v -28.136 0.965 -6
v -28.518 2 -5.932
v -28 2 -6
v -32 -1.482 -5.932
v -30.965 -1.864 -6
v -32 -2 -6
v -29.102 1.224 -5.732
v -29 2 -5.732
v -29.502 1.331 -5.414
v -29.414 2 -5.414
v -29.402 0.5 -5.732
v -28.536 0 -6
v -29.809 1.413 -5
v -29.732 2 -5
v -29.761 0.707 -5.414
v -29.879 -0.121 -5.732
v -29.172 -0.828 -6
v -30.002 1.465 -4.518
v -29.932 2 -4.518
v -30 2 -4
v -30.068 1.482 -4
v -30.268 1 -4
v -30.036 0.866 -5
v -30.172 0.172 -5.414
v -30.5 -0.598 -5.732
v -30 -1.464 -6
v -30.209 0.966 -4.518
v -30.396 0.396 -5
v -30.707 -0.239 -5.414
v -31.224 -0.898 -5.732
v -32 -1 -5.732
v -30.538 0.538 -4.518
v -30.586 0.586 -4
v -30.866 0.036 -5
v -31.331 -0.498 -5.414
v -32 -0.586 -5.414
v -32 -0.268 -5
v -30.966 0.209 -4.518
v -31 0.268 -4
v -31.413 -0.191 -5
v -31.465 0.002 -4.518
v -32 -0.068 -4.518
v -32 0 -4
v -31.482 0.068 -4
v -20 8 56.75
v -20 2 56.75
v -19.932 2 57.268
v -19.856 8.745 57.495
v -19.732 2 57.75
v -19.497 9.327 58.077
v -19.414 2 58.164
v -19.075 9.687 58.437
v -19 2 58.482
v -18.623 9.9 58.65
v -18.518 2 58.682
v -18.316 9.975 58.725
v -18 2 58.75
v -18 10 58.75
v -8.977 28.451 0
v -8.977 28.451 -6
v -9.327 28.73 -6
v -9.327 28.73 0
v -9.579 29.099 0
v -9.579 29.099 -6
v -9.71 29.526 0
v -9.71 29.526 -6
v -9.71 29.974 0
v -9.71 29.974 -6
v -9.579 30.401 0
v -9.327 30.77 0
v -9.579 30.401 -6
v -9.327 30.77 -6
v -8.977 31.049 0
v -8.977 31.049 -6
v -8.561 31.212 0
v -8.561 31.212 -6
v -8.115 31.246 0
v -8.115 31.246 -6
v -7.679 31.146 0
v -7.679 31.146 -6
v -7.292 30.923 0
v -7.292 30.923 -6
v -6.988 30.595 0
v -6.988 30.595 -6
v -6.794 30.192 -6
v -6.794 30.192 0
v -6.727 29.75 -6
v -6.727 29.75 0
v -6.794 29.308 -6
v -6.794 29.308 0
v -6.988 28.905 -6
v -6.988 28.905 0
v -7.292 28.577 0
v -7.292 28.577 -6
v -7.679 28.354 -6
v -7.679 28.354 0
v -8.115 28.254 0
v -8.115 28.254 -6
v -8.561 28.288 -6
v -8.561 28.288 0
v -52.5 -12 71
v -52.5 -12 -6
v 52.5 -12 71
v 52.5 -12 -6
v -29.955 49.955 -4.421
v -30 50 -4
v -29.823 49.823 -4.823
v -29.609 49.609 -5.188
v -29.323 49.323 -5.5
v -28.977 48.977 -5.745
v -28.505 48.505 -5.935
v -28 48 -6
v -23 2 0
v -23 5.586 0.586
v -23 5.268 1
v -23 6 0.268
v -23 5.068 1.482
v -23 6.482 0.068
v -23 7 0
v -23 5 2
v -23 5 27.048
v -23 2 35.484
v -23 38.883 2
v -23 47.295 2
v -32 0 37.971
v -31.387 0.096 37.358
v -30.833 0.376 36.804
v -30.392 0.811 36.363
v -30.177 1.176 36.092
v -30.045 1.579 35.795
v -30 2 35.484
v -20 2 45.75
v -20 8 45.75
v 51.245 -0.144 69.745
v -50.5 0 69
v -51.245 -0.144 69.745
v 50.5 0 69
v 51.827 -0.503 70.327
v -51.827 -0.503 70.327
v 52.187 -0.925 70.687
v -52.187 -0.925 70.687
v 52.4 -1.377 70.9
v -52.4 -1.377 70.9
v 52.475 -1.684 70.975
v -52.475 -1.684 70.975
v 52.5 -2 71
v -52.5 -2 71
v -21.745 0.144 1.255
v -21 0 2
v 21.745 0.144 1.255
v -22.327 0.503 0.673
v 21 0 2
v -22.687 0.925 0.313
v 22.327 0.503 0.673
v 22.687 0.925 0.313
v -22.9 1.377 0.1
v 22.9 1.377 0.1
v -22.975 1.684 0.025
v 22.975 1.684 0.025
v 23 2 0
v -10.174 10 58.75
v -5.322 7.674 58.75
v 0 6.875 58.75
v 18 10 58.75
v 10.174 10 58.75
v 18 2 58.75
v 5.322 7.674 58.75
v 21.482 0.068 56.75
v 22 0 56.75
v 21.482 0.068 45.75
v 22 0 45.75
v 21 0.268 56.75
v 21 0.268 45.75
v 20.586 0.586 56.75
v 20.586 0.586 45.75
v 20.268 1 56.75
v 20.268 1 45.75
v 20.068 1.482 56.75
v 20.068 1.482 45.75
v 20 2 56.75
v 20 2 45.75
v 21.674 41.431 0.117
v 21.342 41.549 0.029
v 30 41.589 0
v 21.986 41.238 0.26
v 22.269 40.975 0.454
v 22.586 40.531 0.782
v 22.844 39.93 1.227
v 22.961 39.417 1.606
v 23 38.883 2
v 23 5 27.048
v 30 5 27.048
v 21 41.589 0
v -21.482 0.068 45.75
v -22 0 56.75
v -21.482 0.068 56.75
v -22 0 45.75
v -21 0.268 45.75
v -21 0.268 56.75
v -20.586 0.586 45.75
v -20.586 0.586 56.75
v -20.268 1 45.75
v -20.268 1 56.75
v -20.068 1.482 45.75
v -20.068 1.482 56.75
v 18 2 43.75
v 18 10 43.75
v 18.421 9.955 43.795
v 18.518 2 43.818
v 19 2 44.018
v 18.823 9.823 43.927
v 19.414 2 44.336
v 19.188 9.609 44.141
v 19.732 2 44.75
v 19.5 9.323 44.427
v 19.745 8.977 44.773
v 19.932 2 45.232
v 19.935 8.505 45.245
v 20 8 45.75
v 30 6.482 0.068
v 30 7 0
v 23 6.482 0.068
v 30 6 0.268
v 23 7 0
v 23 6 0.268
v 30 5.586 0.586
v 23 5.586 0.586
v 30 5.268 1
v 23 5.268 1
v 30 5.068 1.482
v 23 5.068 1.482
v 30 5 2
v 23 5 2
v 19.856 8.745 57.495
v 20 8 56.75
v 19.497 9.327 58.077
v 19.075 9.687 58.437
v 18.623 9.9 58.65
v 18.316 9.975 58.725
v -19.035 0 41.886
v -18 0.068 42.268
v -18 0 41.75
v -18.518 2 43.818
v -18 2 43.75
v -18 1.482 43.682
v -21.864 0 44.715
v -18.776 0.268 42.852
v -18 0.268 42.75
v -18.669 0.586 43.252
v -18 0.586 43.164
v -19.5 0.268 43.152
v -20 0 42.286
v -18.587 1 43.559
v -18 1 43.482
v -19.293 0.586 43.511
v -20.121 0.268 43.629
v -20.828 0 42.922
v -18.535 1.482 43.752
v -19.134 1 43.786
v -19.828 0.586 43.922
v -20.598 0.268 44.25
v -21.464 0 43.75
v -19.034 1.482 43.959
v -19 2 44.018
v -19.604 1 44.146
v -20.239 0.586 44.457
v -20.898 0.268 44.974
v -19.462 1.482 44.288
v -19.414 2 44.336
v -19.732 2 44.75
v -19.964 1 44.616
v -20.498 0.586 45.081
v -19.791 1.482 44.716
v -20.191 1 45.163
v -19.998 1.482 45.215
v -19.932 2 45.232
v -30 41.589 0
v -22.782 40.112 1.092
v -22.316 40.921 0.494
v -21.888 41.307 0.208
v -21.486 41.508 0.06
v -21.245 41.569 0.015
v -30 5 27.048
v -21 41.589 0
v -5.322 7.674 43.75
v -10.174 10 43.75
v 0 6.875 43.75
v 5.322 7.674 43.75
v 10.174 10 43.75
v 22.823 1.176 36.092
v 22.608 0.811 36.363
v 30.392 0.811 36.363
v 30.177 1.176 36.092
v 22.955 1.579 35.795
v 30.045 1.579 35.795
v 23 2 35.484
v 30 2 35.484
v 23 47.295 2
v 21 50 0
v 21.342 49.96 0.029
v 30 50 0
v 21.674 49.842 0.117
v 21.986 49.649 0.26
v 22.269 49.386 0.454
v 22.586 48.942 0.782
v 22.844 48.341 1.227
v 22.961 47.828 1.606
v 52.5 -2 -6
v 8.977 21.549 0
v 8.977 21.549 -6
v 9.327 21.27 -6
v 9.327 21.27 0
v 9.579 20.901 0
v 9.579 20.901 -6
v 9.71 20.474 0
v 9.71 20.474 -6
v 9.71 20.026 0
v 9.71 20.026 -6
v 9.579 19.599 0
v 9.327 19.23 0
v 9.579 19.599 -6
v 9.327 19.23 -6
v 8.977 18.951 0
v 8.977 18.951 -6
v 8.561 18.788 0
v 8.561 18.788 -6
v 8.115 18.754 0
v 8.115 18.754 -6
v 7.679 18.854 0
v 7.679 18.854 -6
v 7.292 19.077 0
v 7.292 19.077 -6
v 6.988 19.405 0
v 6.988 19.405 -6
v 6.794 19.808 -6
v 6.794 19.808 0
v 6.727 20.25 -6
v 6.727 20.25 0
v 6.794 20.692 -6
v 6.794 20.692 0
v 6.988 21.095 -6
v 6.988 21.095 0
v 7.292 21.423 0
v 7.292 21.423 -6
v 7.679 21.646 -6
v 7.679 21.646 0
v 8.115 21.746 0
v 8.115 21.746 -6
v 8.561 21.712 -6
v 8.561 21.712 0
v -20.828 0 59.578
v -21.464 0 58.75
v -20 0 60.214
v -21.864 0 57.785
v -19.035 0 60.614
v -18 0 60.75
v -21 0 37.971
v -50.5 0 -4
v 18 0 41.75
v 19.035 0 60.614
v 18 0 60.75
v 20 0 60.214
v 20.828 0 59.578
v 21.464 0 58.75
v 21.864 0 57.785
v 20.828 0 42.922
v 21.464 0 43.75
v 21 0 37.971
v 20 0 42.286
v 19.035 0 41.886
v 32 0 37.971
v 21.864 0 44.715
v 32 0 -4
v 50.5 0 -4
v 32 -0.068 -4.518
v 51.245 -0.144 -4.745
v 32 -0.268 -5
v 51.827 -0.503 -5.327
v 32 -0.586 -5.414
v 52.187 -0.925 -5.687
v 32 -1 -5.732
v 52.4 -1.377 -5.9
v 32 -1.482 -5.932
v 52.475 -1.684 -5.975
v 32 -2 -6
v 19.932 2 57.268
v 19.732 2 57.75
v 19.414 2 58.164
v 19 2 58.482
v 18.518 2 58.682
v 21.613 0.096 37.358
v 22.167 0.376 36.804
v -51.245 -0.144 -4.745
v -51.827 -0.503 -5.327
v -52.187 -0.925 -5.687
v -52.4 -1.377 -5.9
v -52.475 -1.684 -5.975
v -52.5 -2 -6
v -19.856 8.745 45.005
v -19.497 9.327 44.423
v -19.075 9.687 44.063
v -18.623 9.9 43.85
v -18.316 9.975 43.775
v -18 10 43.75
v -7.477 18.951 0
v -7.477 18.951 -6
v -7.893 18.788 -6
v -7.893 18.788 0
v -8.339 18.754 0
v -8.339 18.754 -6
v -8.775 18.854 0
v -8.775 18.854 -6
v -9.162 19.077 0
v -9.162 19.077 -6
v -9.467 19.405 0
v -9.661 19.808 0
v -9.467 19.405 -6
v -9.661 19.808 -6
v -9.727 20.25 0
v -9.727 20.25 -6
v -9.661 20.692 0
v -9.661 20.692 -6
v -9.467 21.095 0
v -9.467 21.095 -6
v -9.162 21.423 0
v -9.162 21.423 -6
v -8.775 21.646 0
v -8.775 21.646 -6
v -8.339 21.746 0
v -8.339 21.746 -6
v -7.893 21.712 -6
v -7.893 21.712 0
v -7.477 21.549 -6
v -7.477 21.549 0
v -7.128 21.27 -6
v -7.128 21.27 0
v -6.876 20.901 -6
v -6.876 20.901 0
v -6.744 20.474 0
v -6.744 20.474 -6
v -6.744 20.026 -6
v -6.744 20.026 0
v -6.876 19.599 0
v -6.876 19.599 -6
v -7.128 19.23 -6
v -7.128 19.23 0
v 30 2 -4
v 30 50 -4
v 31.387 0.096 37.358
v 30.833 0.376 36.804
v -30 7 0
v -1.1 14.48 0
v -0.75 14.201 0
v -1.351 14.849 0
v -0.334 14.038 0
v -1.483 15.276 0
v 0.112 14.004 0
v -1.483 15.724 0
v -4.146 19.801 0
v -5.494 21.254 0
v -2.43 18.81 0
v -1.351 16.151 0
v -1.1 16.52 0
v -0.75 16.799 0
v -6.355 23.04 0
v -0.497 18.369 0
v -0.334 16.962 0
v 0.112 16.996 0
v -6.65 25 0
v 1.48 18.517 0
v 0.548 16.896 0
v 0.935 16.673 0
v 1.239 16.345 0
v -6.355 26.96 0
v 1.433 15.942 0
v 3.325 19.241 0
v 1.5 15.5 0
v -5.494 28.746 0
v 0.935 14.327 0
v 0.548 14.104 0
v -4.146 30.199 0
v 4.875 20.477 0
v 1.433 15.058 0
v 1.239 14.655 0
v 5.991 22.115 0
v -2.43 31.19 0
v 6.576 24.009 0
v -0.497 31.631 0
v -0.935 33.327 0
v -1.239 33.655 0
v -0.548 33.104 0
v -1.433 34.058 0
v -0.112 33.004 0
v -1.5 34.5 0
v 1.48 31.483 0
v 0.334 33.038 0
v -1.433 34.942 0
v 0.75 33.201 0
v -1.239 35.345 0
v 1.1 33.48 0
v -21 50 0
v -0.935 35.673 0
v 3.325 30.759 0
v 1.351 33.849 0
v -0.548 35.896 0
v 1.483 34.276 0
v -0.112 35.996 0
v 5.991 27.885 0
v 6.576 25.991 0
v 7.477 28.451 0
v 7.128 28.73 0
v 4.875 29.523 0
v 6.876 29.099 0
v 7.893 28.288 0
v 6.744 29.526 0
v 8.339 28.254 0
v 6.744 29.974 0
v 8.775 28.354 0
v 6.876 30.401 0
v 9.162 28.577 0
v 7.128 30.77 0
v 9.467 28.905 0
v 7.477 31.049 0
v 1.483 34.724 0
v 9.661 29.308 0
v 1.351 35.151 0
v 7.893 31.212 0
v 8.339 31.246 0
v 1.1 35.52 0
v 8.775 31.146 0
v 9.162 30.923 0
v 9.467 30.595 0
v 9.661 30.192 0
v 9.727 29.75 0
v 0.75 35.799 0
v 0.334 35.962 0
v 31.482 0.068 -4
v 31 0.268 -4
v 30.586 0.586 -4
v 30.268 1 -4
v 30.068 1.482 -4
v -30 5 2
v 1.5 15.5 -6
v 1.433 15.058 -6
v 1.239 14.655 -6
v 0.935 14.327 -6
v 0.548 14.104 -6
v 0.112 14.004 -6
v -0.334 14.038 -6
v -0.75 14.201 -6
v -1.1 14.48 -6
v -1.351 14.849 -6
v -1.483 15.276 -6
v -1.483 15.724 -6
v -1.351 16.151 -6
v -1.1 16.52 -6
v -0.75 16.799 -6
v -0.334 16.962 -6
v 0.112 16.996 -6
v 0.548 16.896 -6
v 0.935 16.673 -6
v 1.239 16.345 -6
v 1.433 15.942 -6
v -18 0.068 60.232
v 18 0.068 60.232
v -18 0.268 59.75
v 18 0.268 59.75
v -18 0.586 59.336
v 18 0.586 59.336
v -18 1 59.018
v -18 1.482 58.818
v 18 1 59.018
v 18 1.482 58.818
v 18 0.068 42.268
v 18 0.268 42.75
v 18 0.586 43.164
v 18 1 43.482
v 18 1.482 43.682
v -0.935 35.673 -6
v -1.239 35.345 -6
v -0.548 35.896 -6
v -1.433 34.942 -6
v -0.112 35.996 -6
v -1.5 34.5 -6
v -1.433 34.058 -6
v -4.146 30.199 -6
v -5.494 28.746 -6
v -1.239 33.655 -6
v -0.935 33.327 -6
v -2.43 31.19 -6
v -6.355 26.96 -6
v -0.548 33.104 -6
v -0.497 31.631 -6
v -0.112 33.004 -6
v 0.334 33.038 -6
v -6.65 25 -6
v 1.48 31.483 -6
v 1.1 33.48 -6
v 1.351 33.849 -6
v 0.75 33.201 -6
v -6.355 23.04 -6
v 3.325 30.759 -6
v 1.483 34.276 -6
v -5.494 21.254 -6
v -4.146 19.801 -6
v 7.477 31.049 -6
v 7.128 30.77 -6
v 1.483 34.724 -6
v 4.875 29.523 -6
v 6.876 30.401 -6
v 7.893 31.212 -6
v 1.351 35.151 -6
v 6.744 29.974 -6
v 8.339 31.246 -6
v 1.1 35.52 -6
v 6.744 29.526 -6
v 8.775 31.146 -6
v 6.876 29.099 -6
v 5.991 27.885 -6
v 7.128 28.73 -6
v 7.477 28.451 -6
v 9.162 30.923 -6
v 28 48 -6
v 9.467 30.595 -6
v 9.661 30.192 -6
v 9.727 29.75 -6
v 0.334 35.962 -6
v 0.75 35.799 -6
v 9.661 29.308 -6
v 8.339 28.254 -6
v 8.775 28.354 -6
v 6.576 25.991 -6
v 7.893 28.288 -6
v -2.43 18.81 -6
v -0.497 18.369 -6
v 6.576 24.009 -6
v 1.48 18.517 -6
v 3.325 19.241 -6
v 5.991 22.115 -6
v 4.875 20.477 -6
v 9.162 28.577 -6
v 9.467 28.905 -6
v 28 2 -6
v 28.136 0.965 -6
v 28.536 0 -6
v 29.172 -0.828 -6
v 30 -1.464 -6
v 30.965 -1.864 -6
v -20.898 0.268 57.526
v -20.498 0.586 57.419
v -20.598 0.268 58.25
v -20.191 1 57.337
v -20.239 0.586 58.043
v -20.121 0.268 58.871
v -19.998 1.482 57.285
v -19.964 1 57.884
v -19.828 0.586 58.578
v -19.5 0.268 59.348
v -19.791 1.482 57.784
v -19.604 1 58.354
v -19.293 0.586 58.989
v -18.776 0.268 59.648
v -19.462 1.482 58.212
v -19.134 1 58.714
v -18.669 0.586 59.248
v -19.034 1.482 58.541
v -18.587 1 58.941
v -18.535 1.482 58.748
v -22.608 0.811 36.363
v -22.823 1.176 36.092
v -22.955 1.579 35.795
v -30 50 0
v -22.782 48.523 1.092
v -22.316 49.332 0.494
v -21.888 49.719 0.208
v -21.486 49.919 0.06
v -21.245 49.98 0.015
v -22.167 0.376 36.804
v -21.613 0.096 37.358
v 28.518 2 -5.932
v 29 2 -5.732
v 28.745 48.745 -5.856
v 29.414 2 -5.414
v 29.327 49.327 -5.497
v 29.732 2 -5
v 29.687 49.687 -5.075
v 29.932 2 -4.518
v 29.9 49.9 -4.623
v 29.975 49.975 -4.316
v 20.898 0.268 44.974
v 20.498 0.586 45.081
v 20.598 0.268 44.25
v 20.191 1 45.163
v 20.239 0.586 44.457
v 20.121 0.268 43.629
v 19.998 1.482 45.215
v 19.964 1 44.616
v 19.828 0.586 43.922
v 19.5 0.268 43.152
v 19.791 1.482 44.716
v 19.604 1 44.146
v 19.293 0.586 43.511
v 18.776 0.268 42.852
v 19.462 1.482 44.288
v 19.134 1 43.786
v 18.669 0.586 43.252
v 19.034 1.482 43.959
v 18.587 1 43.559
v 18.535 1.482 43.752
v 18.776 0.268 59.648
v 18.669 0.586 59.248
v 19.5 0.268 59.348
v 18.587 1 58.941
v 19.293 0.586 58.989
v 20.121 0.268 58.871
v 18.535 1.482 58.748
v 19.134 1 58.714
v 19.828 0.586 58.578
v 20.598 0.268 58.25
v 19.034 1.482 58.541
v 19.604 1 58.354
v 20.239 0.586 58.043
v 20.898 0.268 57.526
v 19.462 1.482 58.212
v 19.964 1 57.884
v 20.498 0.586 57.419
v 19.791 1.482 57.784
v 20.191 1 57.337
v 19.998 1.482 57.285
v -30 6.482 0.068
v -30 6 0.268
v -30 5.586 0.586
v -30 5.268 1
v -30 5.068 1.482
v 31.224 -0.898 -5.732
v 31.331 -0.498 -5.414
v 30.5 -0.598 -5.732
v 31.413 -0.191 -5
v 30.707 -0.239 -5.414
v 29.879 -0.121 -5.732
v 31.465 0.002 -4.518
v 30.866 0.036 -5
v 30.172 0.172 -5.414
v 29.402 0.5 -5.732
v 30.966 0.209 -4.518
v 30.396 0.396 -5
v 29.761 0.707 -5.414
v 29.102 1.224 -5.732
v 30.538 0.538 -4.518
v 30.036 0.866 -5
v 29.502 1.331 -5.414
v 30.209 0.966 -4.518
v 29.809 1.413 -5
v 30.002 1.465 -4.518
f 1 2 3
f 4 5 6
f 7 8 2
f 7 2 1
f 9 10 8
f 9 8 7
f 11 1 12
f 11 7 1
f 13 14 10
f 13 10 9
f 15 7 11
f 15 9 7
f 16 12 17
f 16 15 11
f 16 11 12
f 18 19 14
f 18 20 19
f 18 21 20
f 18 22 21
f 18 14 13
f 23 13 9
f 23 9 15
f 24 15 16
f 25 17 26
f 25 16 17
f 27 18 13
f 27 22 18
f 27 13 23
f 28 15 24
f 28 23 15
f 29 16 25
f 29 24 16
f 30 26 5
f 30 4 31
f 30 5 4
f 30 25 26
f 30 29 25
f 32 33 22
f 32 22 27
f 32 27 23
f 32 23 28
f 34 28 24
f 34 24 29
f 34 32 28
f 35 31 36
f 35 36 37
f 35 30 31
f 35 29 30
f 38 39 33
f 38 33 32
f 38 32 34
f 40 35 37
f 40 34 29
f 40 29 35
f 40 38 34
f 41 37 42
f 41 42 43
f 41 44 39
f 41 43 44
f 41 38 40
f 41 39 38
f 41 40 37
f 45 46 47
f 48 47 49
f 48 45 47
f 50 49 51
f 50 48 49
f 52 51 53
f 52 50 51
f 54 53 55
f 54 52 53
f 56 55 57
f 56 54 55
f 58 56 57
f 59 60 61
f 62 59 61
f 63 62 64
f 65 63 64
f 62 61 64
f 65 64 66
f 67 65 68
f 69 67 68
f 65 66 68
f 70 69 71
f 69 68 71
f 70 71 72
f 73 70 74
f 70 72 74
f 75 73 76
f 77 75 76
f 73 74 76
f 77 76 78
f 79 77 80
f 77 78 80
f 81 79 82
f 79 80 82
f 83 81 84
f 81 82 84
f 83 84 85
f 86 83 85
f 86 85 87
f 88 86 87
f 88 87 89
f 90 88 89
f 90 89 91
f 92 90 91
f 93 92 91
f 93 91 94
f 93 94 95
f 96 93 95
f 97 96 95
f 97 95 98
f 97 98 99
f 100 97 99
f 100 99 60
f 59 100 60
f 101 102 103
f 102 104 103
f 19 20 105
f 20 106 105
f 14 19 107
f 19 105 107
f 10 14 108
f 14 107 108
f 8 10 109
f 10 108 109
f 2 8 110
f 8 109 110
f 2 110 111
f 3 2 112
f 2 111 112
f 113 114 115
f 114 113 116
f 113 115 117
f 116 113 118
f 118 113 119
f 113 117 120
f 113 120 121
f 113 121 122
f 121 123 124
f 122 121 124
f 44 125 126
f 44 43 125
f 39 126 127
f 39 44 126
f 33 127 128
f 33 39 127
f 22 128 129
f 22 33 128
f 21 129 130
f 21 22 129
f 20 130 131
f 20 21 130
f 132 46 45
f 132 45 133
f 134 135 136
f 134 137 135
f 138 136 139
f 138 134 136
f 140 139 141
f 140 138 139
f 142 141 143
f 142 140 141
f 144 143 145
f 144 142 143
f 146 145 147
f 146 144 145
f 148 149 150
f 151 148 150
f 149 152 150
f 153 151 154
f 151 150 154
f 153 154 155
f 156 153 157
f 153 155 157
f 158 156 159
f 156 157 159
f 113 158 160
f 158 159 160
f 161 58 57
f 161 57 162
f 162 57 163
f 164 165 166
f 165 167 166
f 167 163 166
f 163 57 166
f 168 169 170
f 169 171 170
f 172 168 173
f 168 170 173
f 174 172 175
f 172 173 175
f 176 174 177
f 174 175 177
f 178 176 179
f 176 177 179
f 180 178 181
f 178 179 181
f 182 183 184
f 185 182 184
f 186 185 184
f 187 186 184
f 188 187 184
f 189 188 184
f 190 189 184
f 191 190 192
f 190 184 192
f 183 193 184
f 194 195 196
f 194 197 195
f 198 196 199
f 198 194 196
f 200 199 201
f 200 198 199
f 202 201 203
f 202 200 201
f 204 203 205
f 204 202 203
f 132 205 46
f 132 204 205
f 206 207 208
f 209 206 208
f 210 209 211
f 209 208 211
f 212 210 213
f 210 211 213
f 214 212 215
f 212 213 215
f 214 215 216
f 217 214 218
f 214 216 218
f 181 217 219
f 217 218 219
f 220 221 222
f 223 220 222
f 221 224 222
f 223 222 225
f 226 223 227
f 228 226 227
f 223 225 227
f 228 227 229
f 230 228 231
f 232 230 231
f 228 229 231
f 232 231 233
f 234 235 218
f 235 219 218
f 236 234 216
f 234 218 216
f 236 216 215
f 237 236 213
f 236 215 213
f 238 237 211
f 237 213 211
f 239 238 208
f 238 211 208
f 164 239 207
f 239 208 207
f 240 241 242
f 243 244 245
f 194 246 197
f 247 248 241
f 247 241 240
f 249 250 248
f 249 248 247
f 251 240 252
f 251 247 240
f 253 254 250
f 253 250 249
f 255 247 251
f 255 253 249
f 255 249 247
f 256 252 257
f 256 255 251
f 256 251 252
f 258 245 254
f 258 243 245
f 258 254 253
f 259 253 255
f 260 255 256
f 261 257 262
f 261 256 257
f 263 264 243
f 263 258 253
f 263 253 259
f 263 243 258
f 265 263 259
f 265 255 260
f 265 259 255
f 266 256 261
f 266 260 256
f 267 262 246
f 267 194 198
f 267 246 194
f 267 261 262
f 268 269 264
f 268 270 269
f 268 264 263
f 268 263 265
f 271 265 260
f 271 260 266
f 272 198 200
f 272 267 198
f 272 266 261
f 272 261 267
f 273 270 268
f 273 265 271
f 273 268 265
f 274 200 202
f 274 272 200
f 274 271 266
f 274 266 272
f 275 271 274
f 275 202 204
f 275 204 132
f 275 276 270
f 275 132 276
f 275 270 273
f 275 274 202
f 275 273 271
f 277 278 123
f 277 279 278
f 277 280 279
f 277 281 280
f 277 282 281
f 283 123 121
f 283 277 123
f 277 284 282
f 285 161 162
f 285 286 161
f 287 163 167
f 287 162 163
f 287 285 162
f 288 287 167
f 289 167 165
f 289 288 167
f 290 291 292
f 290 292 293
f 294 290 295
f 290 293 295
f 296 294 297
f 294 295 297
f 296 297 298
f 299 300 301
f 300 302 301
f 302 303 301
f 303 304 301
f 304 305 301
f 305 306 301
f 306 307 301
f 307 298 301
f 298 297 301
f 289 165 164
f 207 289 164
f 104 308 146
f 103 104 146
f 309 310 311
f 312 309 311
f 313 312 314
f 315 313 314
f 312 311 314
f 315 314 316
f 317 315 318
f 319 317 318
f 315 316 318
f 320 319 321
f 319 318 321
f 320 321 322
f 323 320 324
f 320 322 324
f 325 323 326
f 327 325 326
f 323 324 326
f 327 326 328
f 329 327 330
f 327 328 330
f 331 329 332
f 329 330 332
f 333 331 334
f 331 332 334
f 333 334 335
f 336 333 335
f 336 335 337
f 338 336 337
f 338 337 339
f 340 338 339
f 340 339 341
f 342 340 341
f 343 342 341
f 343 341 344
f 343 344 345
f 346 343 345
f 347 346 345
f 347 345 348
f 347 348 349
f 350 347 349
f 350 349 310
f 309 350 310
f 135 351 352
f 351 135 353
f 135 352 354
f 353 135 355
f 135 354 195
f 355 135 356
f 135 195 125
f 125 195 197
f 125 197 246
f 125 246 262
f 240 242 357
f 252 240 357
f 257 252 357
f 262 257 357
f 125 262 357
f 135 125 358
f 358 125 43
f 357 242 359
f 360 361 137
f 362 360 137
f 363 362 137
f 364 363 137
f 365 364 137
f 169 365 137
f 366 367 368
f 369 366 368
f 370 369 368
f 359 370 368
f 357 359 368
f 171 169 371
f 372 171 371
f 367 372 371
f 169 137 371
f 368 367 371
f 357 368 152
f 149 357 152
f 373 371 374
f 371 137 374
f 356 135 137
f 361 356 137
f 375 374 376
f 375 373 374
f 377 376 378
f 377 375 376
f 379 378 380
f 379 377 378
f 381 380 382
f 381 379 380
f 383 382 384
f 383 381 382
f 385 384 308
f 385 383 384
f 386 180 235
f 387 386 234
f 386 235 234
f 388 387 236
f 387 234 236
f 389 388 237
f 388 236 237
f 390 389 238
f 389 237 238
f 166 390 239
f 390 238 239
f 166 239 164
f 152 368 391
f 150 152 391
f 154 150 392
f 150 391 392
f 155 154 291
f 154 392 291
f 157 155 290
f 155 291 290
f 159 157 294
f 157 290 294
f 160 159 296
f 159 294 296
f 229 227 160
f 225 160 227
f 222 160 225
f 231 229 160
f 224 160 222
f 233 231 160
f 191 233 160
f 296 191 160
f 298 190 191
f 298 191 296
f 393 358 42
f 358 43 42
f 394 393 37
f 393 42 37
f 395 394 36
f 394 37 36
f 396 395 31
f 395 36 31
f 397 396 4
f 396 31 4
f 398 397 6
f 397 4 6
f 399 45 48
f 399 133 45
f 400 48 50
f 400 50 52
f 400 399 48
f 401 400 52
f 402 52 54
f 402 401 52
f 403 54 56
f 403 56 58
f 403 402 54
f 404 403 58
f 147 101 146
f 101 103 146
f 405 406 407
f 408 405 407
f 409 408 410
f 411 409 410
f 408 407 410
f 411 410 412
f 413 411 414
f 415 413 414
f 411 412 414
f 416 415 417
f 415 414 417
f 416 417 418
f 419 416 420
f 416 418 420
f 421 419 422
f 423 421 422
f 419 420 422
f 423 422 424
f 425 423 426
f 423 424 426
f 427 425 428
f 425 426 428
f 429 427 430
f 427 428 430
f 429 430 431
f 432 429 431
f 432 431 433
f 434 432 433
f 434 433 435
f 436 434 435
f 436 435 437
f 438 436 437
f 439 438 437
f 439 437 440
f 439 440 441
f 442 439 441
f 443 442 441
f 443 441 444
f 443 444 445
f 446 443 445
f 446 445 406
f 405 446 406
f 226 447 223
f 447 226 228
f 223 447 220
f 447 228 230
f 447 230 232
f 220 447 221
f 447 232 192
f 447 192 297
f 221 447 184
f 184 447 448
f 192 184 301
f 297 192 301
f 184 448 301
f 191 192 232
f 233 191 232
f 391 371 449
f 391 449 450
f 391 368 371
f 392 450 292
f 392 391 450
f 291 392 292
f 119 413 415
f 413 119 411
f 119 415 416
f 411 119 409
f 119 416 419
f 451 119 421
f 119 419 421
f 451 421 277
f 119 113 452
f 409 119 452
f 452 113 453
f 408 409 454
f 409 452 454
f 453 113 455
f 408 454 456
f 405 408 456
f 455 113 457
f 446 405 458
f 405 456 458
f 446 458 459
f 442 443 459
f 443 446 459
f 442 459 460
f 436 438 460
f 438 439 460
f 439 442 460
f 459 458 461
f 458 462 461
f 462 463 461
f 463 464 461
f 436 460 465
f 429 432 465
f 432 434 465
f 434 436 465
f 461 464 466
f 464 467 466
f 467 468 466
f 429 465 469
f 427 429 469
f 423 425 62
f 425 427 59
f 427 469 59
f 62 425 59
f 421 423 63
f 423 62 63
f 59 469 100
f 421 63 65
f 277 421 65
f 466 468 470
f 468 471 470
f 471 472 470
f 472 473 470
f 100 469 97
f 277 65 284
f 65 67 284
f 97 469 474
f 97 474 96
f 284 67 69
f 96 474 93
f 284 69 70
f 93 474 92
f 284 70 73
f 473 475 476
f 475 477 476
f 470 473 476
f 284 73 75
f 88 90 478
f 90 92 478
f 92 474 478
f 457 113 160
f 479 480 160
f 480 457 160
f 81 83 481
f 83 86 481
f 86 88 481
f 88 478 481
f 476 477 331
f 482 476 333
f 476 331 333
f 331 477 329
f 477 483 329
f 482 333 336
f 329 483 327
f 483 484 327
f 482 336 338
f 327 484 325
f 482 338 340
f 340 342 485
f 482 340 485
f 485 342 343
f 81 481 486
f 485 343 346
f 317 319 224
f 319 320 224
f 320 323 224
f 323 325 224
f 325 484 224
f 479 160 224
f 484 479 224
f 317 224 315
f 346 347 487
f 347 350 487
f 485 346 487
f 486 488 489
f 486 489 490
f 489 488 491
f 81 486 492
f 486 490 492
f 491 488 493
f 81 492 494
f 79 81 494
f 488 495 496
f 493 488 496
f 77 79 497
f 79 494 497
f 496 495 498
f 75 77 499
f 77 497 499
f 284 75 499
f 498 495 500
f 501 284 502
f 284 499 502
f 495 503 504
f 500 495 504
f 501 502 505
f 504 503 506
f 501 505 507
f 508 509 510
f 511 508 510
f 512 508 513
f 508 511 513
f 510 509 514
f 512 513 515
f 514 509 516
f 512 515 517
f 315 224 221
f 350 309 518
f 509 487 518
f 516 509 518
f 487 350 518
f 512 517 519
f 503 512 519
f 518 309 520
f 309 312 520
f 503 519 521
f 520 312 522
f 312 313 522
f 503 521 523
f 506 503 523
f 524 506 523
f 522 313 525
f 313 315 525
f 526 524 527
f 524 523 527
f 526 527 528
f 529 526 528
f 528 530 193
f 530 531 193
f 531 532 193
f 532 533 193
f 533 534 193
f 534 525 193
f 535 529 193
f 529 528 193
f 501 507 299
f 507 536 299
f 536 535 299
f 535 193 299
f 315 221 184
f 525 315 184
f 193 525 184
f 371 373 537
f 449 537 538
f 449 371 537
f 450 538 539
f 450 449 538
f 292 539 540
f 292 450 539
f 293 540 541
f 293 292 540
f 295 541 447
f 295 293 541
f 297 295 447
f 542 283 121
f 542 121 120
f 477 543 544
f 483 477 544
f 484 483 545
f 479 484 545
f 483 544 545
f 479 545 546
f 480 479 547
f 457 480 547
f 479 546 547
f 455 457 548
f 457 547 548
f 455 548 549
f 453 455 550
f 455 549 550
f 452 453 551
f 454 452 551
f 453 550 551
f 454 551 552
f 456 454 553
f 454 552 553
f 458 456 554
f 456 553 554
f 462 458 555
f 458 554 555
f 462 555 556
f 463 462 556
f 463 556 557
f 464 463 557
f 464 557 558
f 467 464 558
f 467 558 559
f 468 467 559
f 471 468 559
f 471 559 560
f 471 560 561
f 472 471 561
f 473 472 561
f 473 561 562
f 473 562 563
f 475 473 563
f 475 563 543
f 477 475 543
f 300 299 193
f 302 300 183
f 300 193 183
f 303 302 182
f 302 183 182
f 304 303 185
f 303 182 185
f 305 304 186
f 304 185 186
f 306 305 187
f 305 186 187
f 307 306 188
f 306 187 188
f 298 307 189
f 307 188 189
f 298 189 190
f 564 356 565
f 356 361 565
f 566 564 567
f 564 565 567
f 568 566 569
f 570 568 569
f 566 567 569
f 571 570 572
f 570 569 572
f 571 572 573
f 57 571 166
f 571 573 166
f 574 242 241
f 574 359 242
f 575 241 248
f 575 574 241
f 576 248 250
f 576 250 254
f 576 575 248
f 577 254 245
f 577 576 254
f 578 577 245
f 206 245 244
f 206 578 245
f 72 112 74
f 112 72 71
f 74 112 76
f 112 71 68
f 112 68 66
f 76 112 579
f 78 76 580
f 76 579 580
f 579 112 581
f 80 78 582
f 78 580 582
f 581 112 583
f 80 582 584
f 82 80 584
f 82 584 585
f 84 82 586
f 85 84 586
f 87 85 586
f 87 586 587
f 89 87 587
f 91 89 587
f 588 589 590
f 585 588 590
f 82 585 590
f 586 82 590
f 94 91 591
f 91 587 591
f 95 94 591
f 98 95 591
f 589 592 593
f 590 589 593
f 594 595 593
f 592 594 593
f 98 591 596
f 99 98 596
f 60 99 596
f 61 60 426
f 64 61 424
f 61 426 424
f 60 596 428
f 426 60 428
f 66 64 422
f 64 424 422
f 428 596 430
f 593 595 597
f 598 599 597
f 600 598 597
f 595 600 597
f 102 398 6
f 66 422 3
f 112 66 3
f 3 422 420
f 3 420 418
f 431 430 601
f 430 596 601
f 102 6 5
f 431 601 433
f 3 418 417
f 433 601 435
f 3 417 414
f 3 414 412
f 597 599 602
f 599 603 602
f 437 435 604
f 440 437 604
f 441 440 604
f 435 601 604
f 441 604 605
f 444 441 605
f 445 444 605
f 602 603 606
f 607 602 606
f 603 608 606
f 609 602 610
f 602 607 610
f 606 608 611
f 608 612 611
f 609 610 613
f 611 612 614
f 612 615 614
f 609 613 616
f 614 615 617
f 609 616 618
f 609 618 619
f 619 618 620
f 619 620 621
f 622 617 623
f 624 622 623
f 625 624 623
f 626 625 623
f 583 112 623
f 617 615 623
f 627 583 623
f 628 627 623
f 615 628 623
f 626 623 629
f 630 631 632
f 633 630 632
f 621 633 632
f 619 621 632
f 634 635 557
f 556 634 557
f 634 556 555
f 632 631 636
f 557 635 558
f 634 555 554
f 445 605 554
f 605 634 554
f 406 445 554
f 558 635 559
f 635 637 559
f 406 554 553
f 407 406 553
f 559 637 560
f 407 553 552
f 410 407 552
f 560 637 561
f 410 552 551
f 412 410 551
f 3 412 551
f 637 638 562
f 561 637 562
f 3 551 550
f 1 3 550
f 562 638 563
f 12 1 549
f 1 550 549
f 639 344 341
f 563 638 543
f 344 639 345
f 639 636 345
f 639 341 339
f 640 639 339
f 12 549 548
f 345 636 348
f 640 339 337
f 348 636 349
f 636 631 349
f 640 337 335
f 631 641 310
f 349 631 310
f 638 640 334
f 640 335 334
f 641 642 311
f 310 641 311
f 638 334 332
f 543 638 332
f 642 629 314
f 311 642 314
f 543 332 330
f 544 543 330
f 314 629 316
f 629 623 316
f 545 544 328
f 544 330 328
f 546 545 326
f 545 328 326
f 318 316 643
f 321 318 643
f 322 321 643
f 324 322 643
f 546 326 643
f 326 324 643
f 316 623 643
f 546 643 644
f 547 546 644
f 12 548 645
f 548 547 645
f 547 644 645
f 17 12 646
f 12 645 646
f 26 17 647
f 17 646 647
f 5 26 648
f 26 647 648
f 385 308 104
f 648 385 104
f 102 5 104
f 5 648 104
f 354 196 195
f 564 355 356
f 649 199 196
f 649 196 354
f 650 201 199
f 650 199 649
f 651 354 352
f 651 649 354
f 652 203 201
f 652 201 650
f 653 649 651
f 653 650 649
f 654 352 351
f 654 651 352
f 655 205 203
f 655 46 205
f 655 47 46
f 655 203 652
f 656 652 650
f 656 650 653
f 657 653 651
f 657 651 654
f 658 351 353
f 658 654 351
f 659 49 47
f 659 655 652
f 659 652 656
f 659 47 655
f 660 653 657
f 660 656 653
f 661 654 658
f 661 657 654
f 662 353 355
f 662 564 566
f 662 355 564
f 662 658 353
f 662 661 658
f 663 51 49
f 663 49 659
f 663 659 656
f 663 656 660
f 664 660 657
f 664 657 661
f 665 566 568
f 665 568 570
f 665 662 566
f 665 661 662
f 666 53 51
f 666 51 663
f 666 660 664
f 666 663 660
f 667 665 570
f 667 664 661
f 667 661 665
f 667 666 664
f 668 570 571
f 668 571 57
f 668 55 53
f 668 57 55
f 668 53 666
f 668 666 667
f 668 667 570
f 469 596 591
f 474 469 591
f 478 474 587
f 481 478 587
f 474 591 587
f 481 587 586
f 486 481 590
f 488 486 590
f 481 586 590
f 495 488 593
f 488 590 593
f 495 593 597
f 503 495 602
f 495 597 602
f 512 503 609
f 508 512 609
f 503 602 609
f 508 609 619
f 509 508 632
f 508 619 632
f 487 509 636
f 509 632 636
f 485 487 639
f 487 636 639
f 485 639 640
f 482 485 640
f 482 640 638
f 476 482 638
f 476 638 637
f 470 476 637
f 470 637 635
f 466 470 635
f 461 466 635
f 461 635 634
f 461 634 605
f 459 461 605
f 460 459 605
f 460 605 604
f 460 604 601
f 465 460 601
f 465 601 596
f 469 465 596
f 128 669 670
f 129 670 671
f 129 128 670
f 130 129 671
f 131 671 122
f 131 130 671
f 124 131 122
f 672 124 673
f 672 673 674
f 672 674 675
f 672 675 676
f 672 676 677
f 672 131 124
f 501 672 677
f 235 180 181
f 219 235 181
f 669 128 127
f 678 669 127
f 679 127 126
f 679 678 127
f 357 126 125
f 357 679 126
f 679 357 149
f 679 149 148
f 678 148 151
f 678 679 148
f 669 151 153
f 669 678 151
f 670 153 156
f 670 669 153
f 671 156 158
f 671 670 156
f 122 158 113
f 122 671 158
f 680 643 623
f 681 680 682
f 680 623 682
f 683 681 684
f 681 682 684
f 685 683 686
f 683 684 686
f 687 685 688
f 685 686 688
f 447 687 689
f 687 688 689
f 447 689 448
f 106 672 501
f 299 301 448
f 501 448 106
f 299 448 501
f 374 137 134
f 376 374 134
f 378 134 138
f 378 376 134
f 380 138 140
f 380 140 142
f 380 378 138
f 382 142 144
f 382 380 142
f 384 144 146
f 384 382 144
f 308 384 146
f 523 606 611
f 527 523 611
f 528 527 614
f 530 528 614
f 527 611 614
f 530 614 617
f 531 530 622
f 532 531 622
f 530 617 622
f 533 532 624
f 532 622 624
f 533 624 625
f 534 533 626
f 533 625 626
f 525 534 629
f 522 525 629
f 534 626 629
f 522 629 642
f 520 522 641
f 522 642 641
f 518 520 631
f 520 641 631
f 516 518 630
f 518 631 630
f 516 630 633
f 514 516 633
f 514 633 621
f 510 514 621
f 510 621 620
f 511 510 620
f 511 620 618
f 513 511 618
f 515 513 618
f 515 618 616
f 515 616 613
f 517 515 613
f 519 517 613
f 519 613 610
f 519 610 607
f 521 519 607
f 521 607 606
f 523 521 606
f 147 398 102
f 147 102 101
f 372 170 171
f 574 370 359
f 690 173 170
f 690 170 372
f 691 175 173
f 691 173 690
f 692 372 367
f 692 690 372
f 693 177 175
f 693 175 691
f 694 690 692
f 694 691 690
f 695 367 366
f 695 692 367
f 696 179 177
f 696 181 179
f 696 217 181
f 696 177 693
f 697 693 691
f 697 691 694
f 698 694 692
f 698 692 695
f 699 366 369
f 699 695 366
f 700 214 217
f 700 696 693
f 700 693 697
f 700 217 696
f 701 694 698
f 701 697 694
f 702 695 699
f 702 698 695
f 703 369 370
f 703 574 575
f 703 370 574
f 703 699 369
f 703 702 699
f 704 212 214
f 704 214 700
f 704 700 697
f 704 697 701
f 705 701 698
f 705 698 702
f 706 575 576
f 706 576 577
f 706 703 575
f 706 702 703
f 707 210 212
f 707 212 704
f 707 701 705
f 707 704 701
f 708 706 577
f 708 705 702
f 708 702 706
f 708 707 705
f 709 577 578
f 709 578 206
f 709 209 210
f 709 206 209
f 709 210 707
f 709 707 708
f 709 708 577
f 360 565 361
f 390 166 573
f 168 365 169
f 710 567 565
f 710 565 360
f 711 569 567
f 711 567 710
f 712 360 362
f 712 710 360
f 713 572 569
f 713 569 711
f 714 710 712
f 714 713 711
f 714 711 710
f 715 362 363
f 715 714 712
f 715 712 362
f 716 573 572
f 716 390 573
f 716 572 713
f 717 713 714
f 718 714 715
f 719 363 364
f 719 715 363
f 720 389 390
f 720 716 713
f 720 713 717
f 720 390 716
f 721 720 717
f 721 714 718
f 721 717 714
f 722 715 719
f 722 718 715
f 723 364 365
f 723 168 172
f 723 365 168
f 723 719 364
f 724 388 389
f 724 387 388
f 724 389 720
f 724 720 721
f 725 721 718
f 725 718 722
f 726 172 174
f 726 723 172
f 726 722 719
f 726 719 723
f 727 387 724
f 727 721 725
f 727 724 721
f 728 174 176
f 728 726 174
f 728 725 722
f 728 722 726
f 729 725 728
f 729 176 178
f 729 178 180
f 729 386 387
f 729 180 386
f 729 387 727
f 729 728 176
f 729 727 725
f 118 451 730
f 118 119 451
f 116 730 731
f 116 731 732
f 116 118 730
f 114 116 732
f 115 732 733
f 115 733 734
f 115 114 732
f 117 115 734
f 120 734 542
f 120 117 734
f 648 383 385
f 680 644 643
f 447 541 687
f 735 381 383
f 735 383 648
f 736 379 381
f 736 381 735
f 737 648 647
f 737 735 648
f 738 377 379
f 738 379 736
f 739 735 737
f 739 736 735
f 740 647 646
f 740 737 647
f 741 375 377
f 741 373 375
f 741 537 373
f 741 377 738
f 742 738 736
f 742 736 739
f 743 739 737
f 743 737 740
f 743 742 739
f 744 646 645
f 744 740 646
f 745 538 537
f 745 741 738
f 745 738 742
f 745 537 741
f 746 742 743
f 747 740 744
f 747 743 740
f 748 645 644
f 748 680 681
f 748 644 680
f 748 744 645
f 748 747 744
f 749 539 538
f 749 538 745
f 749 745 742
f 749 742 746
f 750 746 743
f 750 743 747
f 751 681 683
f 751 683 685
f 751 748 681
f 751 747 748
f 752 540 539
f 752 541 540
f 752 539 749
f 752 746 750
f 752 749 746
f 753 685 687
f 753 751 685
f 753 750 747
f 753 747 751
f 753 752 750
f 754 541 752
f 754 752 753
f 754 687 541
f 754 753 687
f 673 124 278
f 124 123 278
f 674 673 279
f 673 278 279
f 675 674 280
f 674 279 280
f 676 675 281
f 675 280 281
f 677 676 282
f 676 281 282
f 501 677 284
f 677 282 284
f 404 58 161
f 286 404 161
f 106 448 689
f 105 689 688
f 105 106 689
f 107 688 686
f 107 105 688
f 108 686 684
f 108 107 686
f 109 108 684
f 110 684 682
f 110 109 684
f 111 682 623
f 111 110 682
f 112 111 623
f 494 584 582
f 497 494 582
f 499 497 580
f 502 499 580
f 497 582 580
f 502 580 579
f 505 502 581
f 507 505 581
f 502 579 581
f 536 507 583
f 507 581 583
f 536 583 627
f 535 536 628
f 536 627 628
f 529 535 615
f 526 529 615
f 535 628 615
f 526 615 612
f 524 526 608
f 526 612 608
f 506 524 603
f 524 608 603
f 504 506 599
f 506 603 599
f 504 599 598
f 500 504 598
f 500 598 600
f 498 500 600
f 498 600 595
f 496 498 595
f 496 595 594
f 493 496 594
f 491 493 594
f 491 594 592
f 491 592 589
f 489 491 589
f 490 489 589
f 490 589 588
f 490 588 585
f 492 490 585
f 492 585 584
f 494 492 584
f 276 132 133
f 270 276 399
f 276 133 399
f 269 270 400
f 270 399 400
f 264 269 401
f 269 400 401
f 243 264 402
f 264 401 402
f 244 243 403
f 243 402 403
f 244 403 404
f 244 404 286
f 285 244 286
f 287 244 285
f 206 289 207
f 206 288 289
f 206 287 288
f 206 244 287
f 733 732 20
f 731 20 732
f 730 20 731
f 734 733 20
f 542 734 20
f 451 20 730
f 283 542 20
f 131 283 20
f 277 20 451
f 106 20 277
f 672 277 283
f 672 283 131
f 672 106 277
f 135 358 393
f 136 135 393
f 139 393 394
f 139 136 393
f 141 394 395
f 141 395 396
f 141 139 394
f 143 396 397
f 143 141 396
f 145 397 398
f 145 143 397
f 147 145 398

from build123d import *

# Parameters (mm, degrees)
BOSS_EXTRUDE1_DEPTH = 52.5
SKETCH6_W           = 40
SKETCH6_H           = 15
BOSS_EXTRUDE3_DEPTH = 10
SKETCH9_R           = 6.65
SKETCH9_R_2         = 1.5
CUT_EXTRUDE4_DEPTH  = 78
CIRPATTERN2_COUNT   = 6
SKETCH10_R          = 18.125
CUT_EXTRUDE5_DEPTH  = 72
FILLET3_R           = 2
SKETCH11_W          = 22.5
SKETCH11_H          = 50
CUT_EXTRUDE6_DEPTH  = 7
BOSS_EXTRUDE4_DEPTH = 7
CUT_EXTRUDE8_DEPTH  = 83.5
FILLET5_R           = 2


with BuildPart() as part:
    # Sketch1 → Boss-Extrude1 (new body, symmetric)
    with BuildSketch(Plane(origin=(0, 0, 0), x_dir=(0, 0, -1), z_dir=(1, 0, 0))):
        Polygon((0, 0), (0, 50), (6, 50), (6, -12), (-71, -12), (-71, 0), align=None)
    extrude(amount=BOSS_EXTRUDE1_DEPTH, both=True)

    # Sketch6 → Boss-Extrude3 (add)
    with BuildSketch(Plane(origin=(0, 0, 0), x_dir=(1, 0, 0), z_dir=(0, 1, 0))):
        with Locations((0, -51.25)):
            Rectangle(SKETCH6_W, SKETCH6_H)
    extrude(amount=BOSS_EXTRUDE3_DEPTH)

    # Sketch9 → Cut-Extrude4 (cut, through all)
    with BuildSketch(Plane(origin=(0, 0, -6), x_dir=(-1, 0, 0), z_dir=(0, 0, -1))):
        with Locations((0, 25)):
            Circle(SKETCH9_R)
        with Locations((0, 34.5)):
            Circle(SKETCH9_R_2)
    cut_extrude4 = extrude(amount=-CUT_EXTRUDE4_DEPTH, mode=Mode.SUBTRACT)

    # CirPattern2: Cut-Extrude4 ×6 about axis
    cirpattern2_axis = Axis((0, 25, 0), (0, 0, 1))
    for i in range(1, CIRPATTERN2_COUNT):
        add(cut_extrude4.rotate(cirpattern2_axis, i * 360 / CIRPATTERN2_COUNT), mode=Mode.SUBTRACT)

    # Sketch10 → Cut-Extrude5 (cut, through all)
    with BuildSketch(Plane.XY):
        with Locations((0, 25)):
            Circle(SKETCH10_R)
    extrude(amount=CUT_EXTRUDE5_DEPTH, mode=Mode.SUBTRACT)

    # Fillet3
    fillet3_edges = [part.edges().sort_by_distance(p)[0] for p in [
        (-20, 0, 51.25),
        (-20, 5, 43.75),
        (0, 0, 58.75),
        (-20, 5, 58.75),
        (20, 0, 51.25),
        (20, 5, 58.75),
        (0, 0, 43.75),
        (20, 5, 43.75),
        (-20, 10, 51.25),
        (20, 10, 51.25),
    ]]
    fillet(fillet3_edges, radius=FILLET3_R)

    # Sketch11 → Cut-Extrude6 (cut, through all)
    with BuildSketch(Plane.XY):
        with Locations((-41.25, 25)):
            Rectangle(SKETCH11_W, SKETCH11_H)
    cut_extrude6 = extrude(amount=-CUT_EXTRUDE6_DEPTH, mode=Mode.SUBTRACT)

    # Mirror1: Cut-Extrude6 across plane
    add(cut_extrude6.mirror(Plane(origin=(0, 0, 0), x_dir=(0, 0, 1), z_dir=(1, 0, 0))), mode=Mode.SUBTRACT)

    # Sketch13 → Boss-Extrude4 (add)
    with BuildSketch(Plane(origin=(30, 0, 0), x_dir=(0, 0, -1), z_dir=(1, 0, 0))):
        Polygon((0, 0), (-36.962201233, 0), (0, 50), align=None)
    boss_extrude4 = extrude(amount=-BOSS_EXTRUDE4_DEPTH)

    # Sketch14 → Cut-Extrude8 (cut, through all)
    with BuildSketch(Plane(origin=(30, 0, 0), x_dir=(0, 0, -1), z_dir=(1, 0, 0))):
        Polygon((-27.048100185, 5), (0, 5), (0, 41.588865493), align=None)
    cut_extrude8 = extrude(amount=-CUT_EXTRUDE8_DEPTH, mode=Mode.SUBTRACT)

    # Mirror2: Boss-Extrude4, Cut-Extrude8 across plane
    add(boss_extrude4.mirror(Plane(origin=(0, 0, 0), x_dir=(0, 0, 1), z_dir=(1, 0, 0))))
    add(cut_extrude8.mirror(Plane(origin=(0, 0, 0), x_dir=(0, 0, 1), z_dir=(1, 0, 0))), mode=Mode.SUBTRACT)

    # Fillet5
    fillet5_edges = [part.edges().sort_by_distance(p)[0] for p in [
        (30, 25, -6),
        (-30, 25, -6),
        (23, 0, 18.481100617),
        (26.5, 0, 36.962201233),
        (30, 0, 15.481100617),
        (41.25, 0, -6),
        (52.5, 0, 32.5),
        (0, 0, 71),
        (-52.5, 0, 32.5),
        (-41.25, 0, -6),
        (-30, 0, 15.481100617),
        (-26.5, 0, 36.962201233),
        (-23, 0, 18.481100617),
        (0, 0, 0),
        (0, 50, -6),
        (23, 45.794432746, 0),
        (-23, 45.794432746, 0),
        (26.5, 5, 0),
        (-26.5, 5, 0),
    ]]
    fillet(fillet5_edges, radius=FILLET5_R)


solid = part.part
